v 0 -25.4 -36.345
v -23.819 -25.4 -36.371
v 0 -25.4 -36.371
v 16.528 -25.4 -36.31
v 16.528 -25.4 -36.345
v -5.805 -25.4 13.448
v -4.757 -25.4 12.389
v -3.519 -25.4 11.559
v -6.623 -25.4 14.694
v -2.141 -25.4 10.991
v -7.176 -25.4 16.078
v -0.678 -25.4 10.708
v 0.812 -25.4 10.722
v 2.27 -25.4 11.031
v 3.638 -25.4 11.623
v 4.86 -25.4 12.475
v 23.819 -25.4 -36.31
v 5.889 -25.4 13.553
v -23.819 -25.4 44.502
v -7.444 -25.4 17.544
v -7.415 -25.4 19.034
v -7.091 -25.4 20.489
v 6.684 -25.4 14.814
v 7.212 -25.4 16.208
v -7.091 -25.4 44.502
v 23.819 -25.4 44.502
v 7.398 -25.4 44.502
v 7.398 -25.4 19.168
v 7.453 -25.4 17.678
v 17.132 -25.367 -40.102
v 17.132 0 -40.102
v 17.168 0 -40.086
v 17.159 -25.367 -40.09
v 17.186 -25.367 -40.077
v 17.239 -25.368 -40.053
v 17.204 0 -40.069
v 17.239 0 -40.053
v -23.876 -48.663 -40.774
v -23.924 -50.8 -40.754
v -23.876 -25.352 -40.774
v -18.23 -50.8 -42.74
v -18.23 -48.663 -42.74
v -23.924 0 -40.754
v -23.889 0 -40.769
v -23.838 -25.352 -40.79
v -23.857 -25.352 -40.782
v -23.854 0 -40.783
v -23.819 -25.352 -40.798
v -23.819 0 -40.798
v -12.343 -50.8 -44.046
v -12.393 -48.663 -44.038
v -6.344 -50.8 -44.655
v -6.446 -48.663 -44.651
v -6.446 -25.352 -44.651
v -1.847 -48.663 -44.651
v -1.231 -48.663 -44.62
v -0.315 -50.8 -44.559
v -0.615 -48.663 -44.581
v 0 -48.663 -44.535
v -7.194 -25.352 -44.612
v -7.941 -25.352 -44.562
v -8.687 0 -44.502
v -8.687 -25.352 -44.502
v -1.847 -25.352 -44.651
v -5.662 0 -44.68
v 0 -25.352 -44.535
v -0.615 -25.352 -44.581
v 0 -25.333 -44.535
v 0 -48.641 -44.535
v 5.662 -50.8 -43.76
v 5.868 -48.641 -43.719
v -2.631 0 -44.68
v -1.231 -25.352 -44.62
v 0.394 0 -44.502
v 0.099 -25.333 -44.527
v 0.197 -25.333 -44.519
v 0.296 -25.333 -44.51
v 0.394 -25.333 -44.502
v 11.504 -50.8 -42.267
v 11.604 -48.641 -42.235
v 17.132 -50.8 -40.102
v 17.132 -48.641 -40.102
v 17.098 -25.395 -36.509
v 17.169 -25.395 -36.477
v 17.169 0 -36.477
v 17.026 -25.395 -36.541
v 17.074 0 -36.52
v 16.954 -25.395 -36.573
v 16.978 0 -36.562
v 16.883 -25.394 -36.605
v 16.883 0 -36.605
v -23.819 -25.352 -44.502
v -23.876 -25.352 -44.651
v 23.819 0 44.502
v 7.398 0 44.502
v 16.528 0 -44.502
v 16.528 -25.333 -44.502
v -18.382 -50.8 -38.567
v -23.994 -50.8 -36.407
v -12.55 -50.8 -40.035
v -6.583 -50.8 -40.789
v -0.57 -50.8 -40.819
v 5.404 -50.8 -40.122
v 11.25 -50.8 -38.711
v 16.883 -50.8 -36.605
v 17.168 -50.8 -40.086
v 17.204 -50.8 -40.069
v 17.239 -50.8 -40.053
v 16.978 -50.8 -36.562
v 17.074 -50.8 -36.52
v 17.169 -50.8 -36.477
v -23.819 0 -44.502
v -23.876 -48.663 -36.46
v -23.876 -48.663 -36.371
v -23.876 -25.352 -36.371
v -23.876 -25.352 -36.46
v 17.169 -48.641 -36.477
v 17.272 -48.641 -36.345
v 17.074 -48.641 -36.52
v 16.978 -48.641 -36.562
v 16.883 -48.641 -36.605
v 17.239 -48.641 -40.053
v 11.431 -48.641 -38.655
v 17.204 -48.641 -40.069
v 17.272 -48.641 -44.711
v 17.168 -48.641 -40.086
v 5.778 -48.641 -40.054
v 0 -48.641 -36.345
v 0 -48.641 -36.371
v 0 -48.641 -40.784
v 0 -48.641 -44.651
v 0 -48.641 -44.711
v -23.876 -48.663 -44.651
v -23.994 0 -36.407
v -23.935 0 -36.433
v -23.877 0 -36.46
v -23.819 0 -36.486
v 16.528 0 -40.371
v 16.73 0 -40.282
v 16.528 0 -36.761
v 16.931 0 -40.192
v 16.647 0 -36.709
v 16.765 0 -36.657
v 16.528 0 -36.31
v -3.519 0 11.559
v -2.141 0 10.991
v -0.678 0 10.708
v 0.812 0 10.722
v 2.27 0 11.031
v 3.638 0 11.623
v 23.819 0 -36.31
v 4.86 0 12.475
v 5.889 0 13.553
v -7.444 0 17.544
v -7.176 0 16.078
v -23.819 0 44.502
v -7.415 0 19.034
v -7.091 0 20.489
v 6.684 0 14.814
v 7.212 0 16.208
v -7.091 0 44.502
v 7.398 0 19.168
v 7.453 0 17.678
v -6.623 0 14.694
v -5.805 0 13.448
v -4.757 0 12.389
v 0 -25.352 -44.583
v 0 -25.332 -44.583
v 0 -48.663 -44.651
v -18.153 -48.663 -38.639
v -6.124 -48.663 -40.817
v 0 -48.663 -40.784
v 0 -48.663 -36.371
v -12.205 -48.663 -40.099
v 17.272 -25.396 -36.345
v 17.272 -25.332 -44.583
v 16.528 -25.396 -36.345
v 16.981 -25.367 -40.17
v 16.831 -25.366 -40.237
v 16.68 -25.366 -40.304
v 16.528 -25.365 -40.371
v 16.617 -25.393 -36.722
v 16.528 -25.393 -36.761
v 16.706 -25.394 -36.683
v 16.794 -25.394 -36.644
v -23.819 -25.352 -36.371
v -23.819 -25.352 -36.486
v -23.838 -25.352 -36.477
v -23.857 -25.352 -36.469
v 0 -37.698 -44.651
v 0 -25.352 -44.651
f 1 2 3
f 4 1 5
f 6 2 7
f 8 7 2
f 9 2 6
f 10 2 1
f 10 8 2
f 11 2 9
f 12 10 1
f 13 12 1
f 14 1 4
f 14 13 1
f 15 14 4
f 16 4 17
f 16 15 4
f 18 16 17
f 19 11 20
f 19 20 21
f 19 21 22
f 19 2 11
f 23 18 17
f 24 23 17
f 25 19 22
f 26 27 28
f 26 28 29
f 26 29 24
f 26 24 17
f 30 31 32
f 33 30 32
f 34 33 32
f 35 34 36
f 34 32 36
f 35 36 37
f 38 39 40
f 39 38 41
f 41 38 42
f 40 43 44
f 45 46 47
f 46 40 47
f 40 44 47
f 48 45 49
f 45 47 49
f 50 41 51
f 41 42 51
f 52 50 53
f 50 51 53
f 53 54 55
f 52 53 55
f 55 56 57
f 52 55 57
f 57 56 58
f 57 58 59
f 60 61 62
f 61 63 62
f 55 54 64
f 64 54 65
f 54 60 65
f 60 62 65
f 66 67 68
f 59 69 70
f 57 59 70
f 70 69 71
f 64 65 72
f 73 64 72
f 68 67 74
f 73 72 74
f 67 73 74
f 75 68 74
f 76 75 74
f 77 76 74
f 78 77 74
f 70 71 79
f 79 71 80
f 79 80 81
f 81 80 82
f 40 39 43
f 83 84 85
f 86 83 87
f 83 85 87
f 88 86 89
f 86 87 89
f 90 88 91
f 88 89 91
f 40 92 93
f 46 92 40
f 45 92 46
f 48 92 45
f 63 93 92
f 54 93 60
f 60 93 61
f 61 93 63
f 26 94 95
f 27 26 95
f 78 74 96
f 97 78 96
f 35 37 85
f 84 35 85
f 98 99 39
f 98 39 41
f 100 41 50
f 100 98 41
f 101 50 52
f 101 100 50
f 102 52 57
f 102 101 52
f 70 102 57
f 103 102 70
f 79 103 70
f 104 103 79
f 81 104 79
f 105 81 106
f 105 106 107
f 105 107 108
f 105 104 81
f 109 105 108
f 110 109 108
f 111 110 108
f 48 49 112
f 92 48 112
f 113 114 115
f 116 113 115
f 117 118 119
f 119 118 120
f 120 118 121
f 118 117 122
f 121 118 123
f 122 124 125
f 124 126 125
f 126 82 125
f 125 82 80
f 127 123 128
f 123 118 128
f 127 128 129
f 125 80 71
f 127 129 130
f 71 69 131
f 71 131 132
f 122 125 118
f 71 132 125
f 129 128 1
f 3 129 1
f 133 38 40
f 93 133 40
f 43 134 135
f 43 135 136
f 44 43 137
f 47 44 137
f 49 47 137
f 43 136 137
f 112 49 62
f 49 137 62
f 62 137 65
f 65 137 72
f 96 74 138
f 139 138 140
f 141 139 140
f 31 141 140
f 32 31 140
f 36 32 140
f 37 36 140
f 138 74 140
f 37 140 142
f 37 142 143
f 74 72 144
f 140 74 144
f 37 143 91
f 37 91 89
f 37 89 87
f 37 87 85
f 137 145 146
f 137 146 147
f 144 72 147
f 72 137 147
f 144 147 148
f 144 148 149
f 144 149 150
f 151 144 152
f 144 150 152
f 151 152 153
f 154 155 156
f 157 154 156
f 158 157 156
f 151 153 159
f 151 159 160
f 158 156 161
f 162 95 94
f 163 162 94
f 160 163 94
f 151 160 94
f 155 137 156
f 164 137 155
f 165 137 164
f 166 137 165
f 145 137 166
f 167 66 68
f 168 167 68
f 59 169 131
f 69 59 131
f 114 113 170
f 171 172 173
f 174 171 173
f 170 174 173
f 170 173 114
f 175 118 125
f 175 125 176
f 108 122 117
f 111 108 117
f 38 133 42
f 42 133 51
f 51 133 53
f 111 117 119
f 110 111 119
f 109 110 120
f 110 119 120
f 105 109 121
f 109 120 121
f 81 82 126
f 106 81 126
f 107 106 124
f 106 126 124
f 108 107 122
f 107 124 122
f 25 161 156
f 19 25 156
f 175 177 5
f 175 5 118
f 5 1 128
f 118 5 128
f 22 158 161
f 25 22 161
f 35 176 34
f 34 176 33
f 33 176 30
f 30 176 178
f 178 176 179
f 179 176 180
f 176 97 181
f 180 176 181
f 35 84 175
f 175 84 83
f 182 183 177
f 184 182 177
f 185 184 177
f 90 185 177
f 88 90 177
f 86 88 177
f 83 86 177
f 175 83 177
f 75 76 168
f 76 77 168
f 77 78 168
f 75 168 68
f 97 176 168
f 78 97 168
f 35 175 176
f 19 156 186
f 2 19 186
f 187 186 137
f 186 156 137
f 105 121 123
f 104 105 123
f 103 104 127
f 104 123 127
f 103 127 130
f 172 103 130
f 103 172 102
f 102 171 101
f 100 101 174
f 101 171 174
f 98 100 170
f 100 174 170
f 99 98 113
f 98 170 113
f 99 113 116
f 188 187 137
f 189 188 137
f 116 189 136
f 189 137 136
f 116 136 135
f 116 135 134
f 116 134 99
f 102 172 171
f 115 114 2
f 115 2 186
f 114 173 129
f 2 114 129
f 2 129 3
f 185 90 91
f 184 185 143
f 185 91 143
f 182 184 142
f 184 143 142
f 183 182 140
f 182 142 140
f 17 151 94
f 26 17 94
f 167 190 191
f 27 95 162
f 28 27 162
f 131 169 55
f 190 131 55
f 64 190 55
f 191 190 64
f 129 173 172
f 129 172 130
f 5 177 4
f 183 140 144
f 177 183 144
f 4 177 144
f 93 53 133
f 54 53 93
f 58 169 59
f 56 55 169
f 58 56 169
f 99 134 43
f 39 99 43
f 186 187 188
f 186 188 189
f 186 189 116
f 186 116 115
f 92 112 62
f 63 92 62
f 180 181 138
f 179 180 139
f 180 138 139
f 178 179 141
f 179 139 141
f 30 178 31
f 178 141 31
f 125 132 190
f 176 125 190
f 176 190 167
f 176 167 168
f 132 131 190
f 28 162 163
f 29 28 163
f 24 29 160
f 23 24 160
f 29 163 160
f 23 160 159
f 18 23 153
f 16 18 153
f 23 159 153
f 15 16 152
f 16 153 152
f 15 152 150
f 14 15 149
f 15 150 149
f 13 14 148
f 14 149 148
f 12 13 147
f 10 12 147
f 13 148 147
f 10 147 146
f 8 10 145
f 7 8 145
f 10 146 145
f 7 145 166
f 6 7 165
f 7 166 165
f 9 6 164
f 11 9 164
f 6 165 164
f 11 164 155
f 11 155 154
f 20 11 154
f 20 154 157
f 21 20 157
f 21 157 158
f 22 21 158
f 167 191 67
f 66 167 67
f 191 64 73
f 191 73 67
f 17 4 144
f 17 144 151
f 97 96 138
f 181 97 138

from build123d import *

# Parameters (mm, degrees)
F1_DEPTH = 25.4
F3_DEPTH = 17.272
F4_W     = 23.310908
F4_H     = 8.280322
F5_DEPTH = 23.876
F7_DEPTH = 50.8


with BuildPart() as f1:
    # F0 (on Front) → F1 (new body)
    with BuildSketch(Plane.XZ):
        with BuildLine():
            Line((23.818642, -36.310196), (23.818642, 44.50167))
            Line((23.818642, 44.50167), (7.39786, 44.50167))
            Line((7.39786, 44.50167), (7.39786, 19.167547))
            ThreePointArc((7.39786, 19.167547), (-0.678108, 10.708378), (-7.09106, 20.488605))
            Line((-7.09106, 20.488605), (-7.09106, 44.50167))
            Line((-7.09106, 44.50167), (-23.818642, 44.50167))
            Line((-23.818642, 44.50167), (-23.818642, -44.50167))
            Line((-23.818642, -44.50167), (16.52839, -44.50167))
            Line((16.52839, -44.50167), (16.52839, -36.310196))
            Line((16.52839, -36.310196), (23.818642, -36.310196))
        make_face()
    extrude(amount=F1_DEPTH)

    # F2 (on Right) → F3 (join)
    with BuildSketch(Plane.YZ):
        Polygon((-25.332414, -44.583075), (-25.396273, -36.345303), (-48.64084, -36.345303), (-48.64084, -44.710793), align=None)
    extrude(amount=F3_DEPTH)

    # F4 (on Right) → F5 (join)
    with BuildSketch(Plane.YZ):
        with Locations((-37.007682, -40.510669)):
            Rectangle(F4_W, F4_H)
    extrude(amount=-F5_DEPTH)

    # F6 (on Front) → F7 (join)
    with BuildSketch(Plane.XZ):
        with BuildLine():
            ThreePointArc((16.882643, -36.605049), (-3.576906, -40.894858), (-23.993824, -36.406536))
            Line((-23.993824, -36.406536), (-23.923699, -40.75424))
            ThreePointArc((-23.923699, -40.75424), (-3.327998, -44.695684), (17.132053, -40.101755))
            Line((17.132053, -40.101755), (17.169088, -36.476661))
            ThreePointArc((17.169088, -36.476661), (17.025967, -36.54108), (16.882643, -36.605049))
        make_face()
        with BuildLine():
            Line((17.239213, -40.052999), (17.169088, -36.476661))
            Line((17.169088, -36.476661), (17.132053, -40.101755))
            ThreePointArc((17.132053, -40.101755), (17.185647, -40.077407), (17.239213, -40.052999))
        make_face()
    extrude(amount=F7_DEPTH)


solid = f1.part
